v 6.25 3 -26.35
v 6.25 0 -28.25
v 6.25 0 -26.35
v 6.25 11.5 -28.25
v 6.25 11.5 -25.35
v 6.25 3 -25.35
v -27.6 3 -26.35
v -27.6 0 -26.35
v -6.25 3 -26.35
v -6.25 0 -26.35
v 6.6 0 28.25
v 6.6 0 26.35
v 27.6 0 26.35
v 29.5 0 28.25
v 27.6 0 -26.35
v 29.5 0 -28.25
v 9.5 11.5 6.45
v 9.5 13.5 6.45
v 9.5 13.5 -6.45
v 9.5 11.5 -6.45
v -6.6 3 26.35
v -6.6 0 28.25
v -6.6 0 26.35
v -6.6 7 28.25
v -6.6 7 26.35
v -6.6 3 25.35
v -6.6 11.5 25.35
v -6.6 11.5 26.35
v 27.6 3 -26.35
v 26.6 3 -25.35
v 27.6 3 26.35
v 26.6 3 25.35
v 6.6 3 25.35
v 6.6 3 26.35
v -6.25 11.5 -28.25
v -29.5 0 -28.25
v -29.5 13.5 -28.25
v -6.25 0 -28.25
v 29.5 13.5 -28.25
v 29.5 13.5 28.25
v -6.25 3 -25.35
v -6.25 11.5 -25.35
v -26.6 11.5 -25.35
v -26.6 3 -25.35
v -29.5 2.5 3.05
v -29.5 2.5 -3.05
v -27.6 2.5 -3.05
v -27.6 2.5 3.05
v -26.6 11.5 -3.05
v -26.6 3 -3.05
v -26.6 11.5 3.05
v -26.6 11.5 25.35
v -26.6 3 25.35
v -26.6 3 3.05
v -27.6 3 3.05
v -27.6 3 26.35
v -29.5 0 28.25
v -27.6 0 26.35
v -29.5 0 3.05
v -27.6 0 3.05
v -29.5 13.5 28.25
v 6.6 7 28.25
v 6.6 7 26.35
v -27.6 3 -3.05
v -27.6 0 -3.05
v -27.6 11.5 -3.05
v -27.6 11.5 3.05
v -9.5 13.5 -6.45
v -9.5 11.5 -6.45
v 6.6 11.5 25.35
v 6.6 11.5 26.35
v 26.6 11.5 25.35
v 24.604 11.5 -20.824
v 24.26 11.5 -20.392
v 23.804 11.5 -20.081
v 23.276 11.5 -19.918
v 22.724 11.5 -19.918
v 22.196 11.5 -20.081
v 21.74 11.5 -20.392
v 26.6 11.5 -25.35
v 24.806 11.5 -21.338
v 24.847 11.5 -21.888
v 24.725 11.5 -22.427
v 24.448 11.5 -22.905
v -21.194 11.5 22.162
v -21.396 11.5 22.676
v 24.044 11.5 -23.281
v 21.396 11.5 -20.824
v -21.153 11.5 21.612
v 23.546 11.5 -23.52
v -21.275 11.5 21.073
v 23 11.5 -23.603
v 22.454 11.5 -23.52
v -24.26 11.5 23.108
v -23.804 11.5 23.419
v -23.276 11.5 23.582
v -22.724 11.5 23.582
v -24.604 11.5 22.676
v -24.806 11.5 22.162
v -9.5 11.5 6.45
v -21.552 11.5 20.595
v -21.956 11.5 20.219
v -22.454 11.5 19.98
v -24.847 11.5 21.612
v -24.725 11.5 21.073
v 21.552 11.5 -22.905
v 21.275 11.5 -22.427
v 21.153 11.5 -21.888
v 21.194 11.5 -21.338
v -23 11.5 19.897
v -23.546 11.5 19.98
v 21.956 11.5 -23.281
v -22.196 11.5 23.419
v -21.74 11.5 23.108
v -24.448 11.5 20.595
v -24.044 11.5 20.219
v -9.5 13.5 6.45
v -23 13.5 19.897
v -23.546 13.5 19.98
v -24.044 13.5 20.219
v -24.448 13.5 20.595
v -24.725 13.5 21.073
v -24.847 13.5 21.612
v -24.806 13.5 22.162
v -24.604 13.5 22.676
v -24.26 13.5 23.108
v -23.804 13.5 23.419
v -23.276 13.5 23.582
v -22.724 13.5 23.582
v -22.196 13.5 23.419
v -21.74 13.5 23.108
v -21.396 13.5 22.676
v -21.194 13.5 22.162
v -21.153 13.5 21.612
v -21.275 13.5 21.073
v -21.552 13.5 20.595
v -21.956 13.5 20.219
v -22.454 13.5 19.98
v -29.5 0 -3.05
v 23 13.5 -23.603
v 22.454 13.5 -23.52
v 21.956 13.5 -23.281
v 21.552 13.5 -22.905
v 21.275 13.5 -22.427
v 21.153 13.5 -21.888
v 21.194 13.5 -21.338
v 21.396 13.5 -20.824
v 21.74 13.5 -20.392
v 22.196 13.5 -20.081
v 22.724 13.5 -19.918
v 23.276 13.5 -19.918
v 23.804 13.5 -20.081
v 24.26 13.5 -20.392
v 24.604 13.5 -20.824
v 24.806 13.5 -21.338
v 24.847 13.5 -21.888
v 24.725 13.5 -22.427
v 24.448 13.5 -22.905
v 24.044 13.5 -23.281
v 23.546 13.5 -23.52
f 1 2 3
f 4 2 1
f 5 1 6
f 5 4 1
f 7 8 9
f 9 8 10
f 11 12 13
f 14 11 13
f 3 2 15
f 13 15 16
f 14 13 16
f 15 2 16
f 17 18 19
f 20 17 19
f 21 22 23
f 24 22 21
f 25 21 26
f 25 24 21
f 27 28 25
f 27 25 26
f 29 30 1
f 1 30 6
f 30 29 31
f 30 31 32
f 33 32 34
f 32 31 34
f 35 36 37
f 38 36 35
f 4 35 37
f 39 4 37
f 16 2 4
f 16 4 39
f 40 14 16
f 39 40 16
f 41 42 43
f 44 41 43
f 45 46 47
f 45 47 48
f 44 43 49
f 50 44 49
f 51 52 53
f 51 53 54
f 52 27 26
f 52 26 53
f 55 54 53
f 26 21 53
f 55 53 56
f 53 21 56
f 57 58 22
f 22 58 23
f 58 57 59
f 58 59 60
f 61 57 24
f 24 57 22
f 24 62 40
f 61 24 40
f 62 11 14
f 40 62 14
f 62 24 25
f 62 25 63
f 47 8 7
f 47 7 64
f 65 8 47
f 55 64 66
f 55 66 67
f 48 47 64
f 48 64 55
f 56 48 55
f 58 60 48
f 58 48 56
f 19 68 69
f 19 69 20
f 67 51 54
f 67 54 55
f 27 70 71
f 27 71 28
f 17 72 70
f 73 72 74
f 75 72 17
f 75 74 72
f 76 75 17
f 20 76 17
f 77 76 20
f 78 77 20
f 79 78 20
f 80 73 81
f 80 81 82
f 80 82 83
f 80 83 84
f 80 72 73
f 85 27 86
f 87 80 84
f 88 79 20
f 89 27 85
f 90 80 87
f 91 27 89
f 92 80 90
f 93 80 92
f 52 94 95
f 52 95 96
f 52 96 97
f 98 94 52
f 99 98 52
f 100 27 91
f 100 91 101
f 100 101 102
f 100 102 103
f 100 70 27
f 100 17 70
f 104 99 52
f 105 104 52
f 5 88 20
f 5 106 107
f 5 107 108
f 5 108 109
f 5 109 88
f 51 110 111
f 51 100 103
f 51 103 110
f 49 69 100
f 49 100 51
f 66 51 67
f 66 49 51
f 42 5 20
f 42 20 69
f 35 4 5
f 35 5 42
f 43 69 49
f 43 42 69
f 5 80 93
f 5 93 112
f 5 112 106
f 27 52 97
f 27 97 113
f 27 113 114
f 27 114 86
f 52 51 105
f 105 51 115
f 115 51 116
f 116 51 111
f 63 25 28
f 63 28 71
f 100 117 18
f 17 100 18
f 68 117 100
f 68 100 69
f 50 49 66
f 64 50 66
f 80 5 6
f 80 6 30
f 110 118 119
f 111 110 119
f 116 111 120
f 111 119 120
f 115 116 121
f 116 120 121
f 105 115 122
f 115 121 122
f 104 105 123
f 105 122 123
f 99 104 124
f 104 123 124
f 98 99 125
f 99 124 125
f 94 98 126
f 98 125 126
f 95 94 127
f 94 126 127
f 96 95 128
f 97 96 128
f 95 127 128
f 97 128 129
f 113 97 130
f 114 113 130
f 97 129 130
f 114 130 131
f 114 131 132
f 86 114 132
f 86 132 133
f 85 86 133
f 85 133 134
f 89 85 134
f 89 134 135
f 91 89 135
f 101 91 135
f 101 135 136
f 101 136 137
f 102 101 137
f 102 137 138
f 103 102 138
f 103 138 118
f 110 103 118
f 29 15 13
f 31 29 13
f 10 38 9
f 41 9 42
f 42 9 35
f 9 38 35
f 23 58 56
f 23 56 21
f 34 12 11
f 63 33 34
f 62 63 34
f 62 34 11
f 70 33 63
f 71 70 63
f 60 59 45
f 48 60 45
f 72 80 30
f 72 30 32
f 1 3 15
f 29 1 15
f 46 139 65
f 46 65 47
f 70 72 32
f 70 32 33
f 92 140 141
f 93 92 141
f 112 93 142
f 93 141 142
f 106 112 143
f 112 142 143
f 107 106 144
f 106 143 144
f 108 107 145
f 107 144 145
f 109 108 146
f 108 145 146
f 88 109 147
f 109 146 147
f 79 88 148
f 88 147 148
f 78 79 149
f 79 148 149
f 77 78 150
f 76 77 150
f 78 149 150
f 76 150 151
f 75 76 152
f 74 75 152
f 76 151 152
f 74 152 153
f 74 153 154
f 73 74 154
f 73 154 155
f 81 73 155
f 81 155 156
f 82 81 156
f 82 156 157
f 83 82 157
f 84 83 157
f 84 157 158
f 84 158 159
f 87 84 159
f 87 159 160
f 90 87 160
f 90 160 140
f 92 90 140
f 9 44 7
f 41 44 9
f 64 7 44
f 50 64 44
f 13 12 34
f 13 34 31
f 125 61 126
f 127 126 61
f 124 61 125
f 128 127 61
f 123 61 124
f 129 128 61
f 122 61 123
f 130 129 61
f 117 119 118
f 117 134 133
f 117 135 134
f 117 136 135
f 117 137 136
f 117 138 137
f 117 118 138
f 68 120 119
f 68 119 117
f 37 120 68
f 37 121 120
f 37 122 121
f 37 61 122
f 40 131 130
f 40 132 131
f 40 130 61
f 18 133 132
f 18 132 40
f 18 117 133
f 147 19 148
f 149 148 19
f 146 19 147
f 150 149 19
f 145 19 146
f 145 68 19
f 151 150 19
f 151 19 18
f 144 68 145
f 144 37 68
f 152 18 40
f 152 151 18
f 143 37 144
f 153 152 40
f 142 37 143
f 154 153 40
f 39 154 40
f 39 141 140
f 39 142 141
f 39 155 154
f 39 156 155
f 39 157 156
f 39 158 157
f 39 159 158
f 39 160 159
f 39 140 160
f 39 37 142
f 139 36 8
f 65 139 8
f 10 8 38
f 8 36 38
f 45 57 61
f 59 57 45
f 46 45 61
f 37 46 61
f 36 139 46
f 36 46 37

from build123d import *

# Parameters (mm, degrees)
SKETCH1_W           = 59
SKETCH1_H           = 56.5
BOSS_EXTRUDE1_DEPTH = 13.5
SKETCH2_W           = 55.2
SKETCH2_H           = 52.7
CUT_EXTRUDE1_DEPTH  = 11.5
SKETCH10_W          = 19
SKETCH10_H          = 12.9
CUT_EXTRUDE4_DEPTH  = 10
SKETCH11_W          = 6.1
SKETCH11_H          = 2.5
CUT_EXTRUDE5_DEPTH  = 10
SKETCH12_W          = 12.5
SKETCH12_H          = 11.5
CUT_EXTRUDE6_DEPTH  = 10
SKETCH13_W          = 13.2
SKETCH13_H          = 7
CUT_EXTRUDE7_DEPTH  = 10
BOSS_EXTRUDE2_DEPTH = 8.5
SKETCH16_R          = 1.8526
CUT_EXTRUDE8_DEPTH  = 3


with BuildPart() as part:
    # Sketch1 → Boss-Extrude1 (new body)
    with BuildSketch(Plane(origin=(0, 0, 0), x_dir=(1, 0, 0), z_dir=(0, 1, 0))):
        Rectangle(SKETCH1_W, SKETCH1_H)
    extrude(amount=BOSS_EXTRUDE1_DEPTH)

    # Sketch2 → Cut-Extrude1 (cut)
    with BuildSketch(Plane.XZ):
        Rectangle(SKETCH2_W, SKETCH2_H)
    extrude(amount=-CUT_EXTRUDE1_DEPTH, mode=Mode.SUBTRACT)

    # Sketch10 → Cut-Extrude4 (cut)
    with BuildSketch(Plane(origin=(0, 13.5, 0), x_dir=(1, 0, 0), z_dir=(0, 1, 0))):
        Rectangle(SKETCH10_W, SKETCH10_H)
    extrude(amount=-CUT_EXTRUDE4_DEPTH, mode=Mode.SUBTRACT)

    # Sketch11 → Cut-Extrude5 (cut)
    with BuildSketch(Plane.ZY.offset(29.5)):
        with Locations((0, 1.25)):
            Rectangle(SKETCH11_W, SKETCH11_H)
    extrude(amount=-CUT_EXTRUDE5_DEPTH, mode=Mode.SUBTRACT)

    # Sketch12 → Cut-Extrude6 (cut)
    with BuildSketch(Plane(origin=(0, 0, -28.25), x_dir=(-1, 0, 0), z_dir=(0, 0, -1))):
        with Locations((0, 5.75)):
            Rectangle(SKETCH12_W, SKETCH12_H)
    extrude(amount=-CUT_EXTRUDE6_DEPTH, mode=Mode.SUBTRACT)

    # Sketch13 → Cut-Extrude7 (cut)
    with BuildSketch(Plane.XY.offset(28.25)):
        with Locations((0, 3.5)):
            Rectangle(SKETCH13_W, SKETCH13_H)
    extrude(amount=-CUT_EXTRUDE7_DEPTH, mode=Mode.SUBTRACT)

    # Sketch14 → Boss-Extrude2 (add)
    with BuildSketch(Plane.XZ.offset(-11.5)):
        Polygon((-26.6, 25.35), (-26.6, 3.05), (-27.6, 3.05), (-27.6, 26.35), (-6.6, 26.35), (-6.6, 25.35), align=None)
        Polygon((-27.6, -26.35), (-6.25, -26.35), (-6.25, -25.35), (-26.6, -25.35), (-26.6, -3.05), (-27.6, -3.05), align=None)
        Polygon((27.6, 26.35), (27.6, -26.35), (6.25, -26.35), (6.25, -25.35), (26.6, -25.35), (26.6, 25.35), (6.6, 25.35), (6.6, 26.35), align=None)
    extrude(amount=BOSS_EXTRUDE2_DEPTH)

    # Sketch16 → Cut-Extrude8 (cut)
    with BuildSketch(Plane(origin=(0, 13.5, 0), x_dir=(1, 0, 0), z_dir=(0, 1, 0))):
        with Locations(Location((23, 21.75, 0), (0, 0, 90))):
            Circle(SKETCH16_R)
        with Locations(Location((-23, -21.75, 0), (0, 0, 90))):
            Circle(SKETCH16_R)
    extrude(amount=-CUT_EXTRUDE8_DEPTH, mode=Mode.SUBTRACT)


solid = part.part
